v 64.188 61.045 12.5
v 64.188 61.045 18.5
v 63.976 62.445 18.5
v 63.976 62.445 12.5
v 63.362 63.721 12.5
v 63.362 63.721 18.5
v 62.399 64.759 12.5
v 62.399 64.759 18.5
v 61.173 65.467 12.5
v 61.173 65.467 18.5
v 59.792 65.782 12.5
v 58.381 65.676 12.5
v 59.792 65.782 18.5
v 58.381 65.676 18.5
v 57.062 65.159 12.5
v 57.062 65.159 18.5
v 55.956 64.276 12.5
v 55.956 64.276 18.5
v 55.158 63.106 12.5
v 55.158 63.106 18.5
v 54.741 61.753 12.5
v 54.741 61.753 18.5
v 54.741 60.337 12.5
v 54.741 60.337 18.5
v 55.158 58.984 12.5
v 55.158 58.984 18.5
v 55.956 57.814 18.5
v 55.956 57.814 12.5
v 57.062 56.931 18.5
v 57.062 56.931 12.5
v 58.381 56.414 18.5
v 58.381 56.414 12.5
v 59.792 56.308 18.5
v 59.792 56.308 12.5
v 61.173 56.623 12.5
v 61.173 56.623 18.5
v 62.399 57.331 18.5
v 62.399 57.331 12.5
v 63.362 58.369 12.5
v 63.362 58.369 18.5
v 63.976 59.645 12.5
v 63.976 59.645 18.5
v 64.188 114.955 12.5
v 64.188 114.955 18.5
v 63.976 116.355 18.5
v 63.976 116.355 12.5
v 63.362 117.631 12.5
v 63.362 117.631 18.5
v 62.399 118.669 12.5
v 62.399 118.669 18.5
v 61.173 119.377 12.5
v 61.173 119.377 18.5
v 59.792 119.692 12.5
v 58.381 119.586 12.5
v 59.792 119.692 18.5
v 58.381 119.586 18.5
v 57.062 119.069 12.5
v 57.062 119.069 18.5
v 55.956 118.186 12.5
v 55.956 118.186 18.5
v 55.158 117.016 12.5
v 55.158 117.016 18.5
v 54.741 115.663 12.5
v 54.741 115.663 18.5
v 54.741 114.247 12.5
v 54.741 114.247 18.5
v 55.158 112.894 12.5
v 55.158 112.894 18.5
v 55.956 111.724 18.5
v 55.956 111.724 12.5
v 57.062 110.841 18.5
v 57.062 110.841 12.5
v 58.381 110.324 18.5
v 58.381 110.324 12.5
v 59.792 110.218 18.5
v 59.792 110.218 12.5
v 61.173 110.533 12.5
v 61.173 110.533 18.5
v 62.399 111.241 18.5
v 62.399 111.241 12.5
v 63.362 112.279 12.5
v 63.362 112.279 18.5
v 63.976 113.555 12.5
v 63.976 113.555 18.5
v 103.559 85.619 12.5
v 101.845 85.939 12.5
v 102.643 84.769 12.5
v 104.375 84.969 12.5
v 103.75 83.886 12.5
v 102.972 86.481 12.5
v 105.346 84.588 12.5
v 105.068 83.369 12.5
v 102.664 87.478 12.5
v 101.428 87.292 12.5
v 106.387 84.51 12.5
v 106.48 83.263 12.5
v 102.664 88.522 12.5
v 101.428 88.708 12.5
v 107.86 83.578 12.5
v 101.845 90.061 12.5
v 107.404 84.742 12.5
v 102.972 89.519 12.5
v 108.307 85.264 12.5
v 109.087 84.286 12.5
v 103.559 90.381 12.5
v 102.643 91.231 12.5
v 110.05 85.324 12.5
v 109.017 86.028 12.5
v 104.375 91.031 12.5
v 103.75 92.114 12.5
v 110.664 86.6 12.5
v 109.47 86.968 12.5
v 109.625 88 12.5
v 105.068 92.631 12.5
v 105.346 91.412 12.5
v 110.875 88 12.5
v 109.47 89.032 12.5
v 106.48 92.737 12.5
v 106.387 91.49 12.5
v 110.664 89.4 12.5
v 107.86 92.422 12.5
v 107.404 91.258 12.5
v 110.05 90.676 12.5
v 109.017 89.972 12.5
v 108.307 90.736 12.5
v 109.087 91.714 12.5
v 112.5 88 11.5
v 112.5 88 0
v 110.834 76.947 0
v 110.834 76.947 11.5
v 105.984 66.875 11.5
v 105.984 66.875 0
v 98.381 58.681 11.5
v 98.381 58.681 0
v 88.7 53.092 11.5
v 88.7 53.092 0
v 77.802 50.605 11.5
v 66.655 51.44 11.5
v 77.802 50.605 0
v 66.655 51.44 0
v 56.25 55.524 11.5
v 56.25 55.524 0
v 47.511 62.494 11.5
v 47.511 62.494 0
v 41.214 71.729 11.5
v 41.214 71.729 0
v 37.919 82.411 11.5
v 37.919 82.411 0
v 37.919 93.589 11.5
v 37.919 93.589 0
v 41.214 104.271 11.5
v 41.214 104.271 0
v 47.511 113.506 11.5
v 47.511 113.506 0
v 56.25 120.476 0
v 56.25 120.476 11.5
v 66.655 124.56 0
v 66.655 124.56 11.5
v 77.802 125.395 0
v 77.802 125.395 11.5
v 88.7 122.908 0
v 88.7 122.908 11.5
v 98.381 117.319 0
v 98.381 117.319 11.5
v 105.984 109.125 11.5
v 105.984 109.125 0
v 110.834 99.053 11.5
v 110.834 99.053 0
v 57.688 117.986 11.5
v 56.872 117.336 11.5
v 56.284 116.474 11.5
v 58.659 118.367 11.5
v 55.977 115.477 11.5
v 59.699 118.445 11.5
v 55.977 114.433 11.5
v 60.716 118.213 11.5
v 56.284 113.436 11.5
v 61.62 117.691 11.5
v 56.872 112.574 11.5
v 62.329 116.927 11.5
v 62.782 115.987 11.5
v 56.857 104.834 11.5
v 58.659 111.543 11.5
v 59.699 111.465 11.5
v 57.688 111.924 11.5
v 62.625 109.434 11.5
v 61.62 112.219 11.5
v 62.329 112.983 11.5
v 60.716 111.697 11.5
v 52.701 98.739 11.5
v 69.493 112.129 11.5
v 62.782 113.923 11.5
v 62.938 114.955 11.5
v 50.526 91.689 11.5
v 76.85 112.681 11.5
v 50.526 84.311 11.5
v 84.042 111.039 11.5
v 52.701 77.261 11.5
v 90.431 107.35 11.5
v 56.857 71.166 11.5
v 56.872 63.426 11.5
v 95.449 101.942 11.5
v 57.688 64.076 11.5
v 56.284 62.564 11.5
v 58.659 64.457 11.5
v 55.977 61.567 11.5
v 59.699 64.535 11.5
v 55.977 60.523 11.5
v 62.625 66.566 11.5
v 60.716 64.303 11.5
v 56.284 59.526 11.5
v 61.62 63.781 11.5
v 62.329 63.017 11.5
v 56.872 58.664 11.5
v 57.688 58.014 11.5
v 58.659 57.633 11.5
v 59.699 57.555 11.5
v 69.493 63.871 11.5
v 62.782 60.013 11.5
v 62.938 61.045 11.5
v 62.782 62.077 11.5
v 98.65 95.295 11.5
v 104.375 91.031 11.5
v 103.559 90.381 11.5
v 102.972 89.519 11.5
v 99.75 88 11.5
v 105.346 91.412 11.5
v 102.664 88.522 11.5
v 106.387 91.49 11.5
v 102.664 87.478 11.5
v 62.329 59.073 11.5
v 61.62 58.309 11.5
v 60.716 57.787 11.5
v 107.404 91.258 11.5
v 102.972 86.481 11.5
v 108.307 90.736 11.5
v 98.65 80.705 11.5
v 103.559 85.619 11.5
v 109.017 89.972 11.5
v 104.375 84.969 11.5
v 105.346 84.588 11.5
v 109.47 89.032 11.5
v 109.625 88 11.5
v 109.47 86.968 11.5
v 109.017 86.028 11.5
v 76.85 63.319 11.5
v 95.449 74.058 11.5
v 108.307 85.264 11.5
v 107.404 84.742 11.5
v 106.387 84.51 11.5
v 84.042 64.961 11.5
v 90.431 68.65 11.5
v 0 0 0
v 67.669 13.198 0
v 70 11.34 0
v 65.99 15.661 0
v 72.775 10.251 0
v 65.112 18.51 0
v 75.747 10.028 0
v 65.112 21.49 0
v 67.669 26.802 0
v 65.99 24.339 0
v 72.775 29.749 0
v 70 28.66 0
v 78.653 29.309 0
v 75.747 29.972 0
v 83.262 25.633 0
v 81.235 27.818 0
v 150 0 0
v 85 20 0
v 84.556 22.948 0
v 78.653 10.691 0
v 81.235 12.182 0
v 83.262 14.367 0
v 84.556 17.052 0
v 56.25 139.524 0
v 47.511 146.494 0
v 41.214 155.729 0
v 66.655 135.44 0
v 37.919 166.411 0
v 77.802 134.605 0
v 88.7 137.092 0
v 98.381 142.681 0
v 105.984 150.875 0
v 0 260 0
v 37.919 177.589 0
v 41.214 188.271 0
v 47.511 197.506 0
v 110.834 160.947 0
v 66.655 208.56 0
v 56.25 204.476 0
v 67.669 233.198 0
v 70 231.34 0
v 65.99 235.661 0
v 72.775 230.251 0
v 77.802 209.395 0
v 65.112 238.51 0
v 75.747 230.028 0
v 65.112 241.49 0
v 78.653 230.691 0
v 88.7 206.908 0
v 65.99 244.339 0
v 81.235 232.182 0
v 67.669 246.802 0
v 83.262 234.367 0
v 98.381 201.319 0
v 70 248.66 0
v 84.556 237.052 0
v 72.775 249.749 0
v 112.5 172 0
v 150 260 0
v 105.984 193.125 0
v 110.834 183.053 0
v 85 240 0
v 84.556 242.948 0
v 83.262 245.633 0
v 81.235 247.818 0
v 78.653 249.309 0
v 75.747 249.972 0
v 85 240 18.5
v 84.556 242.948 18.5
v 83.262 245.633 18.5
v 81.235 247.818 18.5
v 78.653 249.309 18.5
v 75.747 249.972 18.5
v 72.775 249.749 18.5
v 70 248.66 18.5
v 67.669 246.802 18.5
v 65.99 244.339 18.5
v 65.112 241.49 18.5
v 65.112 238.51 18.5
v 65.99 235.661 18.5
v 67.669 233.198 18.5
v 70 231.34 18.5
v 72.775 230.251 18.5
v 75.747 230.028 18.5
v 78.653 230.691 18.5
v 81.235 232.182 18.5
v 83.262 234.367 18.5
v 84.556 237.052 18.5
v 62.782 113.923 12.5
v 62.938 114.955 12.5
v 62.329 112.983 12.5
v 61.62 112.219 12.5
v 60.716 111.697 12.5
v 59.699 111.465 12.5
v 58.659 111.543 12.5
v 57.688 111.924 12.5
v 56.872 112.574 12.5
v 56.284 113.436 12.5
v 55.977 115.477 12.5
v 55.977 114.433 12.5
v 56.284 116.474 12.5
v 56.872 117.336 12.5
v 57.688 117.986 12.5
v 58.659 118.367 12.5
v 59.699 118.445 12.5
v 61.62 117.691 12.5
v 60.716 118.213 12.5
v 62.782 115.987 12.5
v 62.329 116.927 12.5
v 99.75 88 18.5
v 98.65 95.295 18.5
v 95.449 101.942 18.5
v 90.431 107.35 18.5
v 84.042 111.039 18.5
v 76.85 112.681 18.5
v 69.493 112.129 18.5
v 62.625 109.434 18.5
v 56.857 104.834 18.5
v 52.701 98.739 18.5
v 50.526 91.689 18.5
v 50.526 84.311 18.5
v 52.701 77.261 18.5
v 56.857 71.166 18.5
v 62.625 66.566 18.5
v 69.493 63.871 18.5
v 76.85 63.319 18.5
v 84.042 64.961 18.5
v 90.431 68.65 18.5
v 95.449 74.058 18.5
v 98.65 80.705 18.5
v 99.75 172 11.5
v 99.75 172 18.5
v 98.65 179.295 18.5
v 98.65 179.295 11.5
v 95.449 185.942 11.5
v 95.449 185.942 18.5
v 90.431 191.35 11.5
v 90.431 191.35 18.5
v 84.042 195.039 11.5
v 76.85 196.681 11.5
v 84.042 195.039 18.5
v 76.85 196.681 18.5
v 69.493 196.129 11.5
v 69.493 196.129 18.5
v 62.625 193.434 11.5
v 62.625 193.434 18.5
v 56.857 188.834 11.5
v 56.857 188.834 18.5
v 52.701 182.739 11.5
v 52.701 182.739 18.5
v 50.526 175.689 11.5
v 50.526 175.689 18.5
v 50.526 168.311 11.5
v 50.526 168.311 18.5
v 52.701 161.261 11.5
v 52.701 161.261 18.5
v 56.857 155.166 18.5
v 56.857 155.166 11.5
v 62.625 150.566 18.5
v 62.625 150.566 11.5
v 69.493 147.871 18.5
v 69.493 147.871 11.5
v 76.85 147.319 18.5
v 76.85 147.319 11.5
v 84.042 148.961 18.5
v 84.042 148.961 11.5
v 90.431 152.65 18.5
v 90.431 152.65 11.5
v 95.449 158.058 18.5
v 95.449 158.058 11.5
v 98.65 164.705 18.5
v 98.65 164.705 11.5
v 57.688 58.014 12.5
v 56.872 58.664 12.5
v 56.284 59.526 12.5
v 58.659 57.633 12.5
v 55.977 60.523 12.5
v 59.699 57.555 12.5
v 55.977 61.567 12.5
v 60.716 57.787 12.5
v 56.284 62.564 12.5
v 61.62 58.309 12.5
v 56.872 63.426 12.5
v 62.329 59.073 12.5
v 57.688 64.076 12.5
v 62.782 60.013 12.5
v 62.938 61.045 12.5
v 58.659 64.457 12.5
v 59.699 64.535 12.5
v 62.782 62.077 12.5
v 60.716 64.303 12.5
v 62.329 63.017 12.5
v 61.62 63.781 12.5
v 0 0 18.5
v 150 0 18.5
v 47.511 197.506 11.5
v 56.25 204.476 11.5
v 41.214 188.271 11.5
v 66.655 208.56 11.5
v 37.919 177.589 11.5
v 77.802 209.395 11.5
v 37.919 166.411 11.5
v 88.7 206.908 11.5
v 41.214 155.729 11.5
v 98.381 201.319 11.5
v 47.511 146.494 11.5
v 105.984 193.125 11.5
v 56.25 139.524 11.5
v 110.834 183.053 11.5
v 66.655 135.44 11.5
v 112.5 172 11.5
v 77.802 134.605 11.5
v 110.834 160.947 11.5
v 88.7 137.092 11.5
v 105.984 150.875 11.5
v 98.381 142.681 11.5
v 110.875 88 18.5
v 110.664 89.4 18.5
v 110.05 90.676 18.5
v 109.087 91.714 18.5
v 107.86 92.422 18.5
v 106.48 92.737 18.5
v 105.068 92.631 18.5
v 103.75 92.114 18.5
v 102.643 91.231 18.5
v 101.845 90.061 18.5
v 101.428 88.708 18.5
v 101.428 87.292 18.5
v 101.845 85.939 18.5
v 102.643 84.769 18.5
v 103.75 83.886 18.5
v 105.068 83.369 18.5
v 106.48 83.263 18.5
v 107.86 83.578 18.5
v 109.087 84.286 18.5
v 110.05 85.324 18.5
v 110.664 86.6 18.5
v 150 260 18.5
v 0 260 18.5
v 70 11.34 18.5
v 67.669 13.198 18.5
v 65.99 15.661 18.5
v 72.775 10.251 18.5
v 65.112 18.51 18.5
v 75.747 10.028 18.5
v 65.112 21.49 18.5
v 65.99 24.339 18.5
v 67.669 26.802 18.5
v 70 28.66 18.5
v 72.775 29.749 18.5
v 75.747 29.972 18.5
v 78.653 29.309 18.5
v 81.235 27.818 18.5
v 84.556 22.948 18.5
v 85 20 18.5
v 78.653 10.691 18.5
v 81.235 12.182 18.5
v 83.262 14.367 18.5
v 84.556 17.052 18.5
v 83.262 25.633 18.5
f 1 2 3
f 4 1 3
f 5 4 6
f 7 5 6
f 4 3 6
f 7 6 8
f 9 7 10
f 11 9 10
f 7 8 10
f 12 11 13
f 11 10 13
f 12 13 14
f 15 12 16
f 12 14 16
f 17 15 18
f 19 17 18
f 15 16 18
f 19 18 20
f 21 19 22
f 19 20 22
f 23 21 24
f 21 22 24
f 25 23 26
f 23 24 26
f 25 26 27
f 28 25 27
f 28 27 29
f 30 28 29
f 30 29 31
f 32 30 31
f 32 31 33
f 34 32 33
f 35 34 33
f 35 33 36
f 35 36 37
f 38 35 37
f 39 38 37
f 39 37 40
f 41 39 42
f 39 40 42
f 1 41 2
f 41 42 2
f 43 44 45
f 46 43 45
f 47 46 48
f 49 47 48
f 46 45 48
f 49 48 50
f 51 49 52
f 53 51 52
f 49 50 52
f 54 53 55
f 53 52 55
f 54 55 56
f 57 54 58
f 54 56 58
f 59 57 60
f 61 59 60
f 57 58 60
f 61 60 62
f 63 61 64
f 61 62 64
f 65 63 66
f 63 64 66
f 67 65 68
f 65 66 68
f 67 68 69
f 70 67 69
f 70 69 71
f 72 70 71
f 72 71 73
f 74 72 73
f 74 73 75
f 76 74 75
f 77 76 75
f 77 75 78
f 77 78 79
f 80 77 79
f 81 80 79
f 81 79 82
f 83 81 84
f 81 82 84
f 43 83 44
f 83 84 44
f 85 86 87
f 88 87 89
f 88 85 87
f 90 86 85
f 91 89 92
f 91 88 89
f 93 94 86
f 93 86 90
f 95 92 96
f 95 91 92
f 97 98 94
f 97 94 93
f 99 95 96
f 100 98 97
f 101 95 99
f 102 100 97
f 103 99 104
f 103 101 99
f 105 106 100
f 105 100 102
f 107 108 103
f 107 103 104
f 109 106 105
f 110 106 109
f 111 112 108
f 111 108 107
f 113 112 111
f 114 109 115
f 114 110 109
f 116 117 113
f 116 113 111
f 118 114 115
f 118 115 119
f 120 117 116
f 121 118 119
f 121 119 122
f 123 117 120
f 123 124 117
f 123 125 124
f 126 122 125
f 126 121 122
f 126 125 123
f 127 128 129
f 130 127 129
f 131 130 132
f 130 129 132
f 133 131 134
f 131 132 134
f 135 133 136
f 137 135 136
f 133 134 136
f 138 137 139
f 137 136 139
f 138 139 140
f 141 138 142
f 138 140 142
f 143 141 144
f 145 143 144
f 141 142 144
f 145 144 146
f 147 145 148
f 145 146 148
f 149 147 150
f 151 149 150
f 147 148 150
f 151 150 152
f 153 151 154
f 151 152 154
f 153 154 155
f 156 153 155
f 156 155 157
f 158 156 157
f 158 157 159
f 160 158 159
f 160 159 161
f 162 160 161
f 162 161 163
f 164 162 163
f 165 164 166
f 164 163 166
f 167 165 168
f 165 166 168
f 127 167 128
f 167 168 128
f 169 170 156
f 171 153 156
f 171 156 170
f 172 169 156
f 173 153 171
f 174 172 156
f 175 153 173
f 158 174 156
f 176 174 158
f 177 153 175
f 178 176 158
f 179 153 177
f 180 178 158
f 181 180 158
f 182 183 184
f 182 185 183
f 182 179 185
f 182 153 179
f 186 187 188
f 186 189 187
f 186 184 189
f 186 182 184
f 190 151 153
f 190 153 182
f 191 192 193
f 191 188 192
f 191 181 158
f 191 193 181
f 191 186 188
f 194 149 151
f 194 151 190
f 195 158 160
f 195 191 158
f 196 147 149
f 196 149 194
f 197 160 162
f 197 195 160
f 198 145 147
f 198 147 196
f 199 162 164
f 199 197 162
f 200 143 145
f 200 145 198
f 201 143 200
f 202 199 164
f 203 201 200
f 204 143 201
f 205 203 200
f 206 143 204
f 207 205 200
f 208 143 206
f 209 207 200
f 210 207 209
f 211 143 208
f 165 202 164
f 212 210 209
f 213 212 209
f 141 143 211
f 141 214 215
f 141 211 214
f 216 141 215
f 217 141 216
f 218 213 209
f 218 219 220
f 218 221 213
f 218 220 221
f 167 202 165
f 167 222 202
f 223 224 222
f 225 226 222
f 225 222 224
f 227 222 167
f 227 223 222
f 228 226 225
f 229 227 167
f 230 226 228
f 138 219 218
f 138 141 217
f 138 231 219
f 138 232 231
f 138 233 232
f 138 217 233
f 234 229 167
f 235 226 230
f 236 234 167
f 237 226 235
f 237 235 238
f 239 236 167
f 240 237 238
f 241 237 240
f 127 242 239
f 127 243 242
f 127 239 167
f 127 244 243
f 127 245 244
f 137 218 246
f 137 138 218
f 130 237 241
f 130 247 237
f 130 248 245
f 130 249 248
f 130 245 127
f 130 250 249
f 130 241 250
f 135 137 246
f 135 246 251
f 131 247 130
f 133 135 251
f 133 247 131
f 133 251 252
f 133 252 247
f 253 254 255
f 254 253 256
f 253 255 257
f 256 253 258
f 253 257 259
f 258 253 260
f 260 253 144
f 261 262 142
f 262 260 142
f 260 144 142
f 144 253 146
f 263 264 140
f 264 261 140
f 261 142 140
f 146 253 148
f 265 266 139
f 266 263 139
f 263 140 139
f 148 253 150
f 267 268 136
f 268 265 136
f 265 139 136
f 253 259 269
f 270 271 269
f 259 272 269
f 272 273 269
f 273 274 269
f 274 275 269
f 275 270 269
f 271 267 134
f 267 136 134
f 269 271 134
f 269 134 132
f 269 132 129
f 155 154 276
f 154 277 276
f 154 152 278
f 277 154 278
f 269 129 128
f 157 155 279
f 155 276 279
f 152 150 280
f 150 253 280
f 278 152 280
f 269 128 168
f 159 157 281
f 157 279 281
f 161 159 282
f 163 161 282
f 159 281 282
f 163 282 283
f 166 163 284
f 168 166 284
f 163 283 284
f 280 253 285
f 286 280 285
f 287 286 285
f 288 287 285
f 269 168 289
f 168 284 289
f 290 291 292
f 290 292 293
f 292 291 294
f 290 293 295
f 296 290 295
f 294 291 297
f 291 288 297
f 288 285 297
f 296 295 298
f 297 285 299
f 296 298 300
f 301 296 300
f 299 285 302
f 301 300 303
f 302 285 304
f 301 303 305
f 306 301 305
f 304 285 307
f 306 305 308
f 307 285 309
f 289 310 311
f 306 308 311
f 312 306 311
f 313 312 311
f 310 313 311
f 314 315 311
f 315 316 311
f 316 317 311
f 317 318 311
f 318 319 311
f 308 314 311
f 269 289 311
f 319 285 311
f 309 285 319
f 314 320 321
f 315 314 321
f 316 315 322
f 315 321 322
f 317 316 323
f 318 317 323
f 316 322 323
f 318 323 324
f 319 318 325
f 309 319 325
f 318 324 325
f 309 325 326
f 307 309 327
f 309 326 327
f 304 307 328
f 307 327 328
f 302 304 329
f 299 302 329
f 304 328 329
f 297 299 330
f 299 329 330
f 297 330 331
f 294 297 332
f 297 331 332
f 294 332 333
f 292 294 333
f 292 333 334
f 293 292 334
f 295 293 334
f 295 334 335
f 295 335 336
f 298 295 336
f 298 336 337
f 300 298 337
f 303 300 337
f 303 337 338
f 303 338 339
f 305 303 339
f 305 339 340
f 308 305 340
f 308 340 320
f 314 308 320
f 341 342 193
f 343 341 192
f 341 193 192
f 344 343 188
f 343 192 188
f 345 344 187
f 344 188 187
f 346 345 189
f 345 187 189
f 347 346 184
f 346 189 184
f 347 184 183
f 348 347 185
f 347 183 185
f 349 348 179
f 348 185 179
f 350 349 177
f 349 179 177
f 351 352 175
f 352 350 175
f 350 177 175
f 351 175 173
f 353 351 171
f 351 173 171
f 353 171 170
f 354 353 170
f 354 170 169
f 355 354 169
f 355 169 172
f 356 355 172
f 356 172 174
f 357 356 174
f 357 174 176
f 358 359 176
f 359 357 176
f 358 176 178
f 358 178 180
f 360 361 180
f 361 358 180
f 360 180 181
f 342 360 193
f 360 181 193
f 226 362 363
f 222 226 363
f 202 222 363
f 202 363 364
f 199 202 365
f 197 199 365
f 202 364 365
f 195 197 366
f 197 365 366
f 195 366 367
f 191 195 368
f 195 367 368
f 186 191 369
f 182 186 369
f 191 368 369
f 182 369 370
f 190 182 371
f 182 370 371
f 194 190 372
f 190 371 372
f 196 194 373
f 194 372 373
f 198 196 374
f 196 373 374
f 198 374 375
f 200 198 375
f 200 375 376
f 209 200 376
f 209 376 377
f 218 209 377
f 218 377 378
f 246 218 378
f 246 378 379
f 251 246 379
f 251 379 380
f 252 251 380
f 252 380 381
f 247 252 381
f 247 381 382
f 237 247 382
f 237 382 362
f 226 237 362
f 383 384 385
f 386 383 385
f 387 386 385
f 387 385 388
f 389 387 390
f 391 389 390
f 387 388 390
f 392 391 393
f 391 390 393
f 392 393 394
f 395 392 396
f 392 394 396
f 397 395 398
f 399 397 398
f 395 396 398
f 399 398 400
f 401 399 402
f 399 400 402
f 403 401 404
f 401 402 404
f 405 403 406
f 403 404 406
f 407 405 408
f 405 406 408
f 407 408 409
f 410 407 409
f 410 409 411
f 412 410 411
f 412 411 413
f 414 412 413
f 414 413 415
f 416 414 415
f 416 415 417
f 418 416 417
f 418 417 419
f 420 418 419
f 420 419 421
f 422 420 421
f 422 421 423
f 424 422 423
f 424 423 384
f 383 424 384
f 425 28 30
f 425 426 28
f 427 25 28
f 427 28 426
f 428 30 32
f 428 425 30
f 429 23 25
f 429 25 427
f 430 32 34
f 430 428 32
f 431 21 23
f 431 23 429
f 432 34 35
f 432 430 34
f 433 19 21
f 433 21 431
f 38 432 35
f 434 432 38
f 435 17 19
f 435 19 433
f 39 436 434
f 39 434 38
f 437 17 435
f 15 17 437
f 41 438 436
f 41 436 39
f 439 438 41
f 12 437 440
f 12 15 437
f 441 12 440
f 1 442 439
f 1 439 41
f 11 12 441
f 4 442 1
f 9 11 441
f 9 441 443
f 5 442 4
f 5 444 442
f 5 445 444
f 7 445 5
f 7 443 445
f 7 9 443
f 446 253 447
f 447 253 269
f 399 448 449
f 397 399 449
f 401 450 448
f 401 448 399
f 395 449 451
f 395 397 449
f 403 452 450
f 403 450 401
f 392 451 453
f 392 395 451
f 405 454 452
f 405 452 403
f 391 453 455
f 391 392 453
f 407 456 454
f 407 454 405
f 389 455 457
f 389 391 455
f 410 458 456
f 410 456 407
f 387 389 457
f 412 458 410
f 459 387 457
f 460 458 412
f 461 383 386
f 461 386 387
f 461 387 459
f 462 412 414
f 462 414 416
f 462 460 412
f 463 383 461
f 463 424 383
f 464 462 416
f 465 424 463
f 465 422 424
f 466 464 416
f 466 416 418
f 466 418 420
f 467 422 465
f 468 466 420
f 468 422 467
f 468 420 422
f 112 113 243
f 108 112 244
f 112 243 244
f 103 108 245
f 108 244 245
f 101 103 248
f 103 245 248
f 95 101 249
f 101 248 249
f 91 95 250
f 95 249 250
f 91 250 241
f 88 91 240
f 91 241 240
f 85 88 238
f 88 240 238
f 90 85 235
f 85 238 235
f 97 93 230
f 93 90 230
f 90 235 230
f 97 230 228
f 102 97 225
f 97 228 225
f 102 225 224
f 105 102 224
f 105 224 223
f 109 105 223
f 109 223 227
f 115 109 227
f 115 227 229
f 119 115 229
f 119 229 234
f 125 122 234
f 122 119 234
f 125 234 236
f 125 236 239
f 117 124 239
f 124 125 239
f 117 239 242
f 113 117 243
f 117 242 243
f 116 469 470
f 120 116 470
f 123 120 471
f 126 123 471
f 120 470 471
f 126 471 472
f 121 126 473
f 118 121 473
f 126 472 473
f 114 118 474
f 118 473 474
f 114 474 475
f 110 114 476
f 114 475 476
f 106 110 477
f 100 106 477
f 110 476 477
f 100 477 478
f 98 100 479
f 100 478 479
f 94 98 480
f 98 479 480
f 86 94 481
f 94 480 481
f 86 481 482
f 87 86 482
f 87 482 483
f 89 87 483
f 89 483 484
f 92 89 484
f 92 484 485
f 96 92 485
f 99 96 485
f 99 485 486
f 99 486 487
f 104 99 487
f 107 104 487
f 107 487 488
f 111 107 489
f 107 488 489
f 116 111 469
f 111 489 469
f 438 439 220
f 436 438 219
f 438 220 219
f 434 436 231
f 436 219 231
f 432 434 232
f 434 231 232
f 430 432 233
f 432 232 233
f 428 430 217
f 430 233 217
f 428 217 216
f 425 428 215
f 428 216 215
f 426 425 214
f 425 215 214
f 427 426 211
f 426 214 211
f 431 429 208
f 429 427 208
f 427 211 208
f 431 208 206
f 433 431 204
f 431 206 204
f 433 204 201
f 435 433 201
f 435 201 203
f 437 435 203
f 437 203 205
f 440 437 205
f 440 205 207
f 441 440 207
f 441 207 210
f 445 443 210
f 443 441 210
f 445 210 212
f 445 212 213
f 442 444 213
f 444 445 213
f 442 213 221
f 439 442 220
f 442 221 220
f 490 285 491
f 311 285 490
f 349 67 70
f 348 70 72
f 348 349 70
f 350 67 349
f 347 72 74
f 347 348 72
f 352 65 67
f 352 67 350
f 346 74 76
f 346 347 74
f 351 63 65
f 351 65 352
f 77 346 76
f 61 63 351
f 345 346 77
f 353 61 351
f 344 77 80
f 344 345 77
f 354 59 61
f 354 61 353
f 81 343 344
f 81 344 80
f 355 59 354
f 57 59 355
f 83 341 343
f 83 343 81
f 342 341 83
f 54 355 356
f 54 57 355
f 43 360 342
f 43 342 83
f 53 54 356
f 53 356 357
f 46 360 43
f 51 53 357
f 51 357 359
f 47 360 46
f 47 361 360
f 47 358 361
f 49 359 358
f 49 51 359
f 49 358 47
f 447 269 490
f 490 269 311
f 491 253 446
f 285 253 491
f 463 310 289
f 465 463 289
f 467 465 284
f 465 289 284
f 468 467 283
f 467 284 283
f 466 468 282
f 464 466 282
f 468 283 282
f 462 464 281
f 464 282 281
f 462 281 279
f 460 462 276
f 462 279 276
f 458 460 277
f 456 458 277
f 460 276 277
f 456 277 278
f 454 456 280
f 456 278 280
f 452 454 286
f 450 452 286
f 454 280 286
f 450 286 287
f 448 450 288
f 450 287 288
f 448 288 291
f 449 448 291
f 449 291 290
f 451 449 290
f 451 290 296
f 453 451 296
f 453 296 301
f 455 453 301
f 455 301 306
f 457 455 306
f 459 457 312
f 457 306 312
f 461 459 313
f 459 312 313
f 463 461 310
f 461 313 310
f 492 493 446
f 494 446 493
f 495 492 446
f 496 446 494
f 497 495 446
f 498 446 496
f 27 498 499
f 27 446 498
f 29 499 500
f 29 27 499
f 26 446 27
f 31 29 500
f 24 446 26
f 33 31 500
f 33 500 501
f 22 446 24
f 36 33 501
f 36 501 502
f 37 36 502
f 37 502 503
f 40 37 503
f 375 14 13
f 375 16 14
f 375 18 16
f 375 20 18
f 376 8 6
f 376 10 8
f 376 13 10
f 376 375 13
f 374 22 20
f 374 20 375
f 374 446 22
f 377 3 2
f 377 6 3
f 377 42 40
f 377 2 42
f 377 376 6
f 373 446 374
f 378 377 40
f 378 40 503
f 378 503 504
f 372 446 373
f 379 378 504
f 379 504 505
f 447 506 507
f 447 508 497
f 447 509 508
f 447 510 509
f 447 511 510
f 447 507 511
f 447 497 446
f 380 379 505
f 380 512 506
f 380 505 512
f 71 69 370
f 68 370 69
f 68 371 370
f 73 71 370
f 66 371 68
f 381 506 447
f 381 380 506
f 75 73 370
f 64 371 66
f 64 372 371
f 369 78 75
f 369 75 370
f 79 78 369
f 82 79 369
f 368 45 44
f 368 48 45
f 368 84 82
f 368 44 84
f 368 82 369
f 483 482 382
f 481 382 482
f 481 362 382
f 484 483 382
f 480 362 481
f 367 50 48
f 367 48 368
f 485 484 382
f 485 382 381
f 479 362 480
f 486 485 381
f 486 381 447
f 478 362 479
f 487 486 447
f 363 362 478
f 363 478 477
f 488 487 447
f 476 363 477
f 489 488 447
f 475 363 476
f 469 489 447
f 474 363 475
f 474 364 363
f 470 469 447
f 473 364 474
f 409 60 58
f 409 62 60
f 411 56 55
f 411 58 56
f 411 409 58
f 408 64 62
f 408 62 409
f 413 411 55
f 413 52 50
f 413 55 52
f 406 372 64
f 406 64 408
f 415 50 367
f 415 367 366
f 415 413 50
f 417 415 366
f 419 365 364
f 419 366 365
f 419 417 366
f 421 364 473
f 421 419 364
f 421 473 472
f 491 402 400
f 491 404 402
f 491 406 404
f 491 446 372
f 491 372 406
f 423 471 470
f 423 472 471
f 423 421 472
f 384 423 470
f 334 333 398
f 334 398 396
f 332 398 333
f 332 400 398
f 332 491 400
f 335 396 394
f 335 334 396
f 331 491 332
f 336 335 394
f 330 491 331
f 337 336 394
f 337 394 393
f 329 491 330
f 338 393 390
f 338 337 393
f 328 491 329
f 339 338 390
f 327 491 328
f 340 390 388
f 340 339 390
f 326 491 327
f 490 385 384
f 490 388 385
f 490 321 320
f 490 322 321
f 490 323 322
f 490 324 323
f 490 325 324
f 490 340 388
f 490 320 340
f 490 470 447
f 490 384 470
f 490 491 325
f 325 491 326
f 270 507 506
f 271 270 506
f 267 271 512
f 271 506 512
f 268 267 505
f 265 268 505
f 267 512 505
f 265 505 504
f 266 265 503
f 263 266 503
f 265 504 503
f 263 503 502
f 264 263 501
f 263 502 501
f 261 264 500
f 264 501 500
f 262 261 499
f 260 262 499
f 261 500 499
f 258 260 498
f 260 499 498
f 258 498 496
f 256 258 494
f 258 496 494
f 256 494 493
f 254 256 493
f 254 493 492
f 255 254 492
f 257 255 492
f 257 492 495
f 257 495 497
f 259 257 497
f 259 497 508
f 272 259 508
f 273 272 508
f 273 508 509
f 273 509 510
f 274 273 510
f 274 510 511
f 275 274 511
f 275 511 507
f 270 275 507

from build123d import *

# Parameters (mm, degrees)
F0_W      = 150
F0_H      = 260
F1_DEPTH  = 18.5
F2_R      = 10
F3_DEPTH  = 25.4
F4_R      = 24.75
F5_DEPTH  = 25.4
F6_R      = 37.5
F7_DEPTH  = 11.5
F8_R      = 3.5
F9_DEPTH  = 25.4
F10_R     = 4.75
F10_R_2   = 3.5
F11_DEPTH = 6


with BuildPart() as f1:
    # F0 (on Top) → F1 (new body)
    with BuildSketch(Plane.XY):
        with Locations((75, 130)):
            Rectangle(F0_W, F0_H)
    extrude(amount=F1_DEPTH)

    # F2 (on face) → F3 (cut)
    with BuildSketch(Plane.XY.offset(18.5)):
        with Locations((75, 240)):
            Circle(F2_R)
        with Locations((75, 20)):
            Circle(F2_R)
    extrude(amount=-F3_DEPTH, mode=Mode.SUBTRACT)

    # F4 (on face) → F5 (cut)
    with BuildSketch(Plane.XY.offset(18.5)):
        with Locations((75, 172)):
            Circle(F4_R)
        with Locations((75, 88)):
            Circle(F4_R)
    extrude(amount=-F5_DEPTH, mode=Mode.SUBTRACT)

    # F6 (on face) → F7 (cut)
    with BuildSketch(Plane(origin=(0, 0, 0), x_dir=(1, 0, 0), z_dir=(0, 0, -1))):
        with Locations((75, -88)):
            Circle(F6_R)
        with Locations((75, -172)):
            Circle(F6_R)
    extrude(amount=-F7_DEPTH, mode=Mode.SUBTRACT)

    # F8 (on face) → F9 (cut)
    with BuildSketch(Plane(origin=(0, 0, 11.5), x_dir=(1, 0, 0), z_dir=(0, 0, -1))):
        with Locations((106.125, -88)):
            Circle(F8_R)
        with Locations((59.4375, -61.0449593072)):
            Circle(F8_R)
        with Locations((59.4375, -114.9550406928)):
            Circle(F8_R)
    extrude(amount=-F9_DEPTH, mode=Mode.SUBTRACT)

    # F10 (on face) → F11 (cut)
    with BuildSketch(Plane.XY.offset(18.5)):
        with Locations((59.4375, 61.0449593072)):
            Circle(F10_R)
        with Locations((59.4375, 61.0449593072)):
            Circle(F10_R_2, mode=Mode.SUBTRACT)
        with Locations((59.4375, 114.9550406928)):
            Circle(F10_R)
        with Locations((59.4375, 114.9550406928)):
            Circle(F10_R_2, mode=Mode.SUBTRACT)
        with Locations((106.125, 88)):
            Circle(F10_R)
        with Locations((106.125, 88)):
            Circle(F10_R_2, mode=Mode.SUBTRACT)
    extrude(amount=-F11_DEPTH, mode=Mode.SUBTRACT)


solid = f1.part
